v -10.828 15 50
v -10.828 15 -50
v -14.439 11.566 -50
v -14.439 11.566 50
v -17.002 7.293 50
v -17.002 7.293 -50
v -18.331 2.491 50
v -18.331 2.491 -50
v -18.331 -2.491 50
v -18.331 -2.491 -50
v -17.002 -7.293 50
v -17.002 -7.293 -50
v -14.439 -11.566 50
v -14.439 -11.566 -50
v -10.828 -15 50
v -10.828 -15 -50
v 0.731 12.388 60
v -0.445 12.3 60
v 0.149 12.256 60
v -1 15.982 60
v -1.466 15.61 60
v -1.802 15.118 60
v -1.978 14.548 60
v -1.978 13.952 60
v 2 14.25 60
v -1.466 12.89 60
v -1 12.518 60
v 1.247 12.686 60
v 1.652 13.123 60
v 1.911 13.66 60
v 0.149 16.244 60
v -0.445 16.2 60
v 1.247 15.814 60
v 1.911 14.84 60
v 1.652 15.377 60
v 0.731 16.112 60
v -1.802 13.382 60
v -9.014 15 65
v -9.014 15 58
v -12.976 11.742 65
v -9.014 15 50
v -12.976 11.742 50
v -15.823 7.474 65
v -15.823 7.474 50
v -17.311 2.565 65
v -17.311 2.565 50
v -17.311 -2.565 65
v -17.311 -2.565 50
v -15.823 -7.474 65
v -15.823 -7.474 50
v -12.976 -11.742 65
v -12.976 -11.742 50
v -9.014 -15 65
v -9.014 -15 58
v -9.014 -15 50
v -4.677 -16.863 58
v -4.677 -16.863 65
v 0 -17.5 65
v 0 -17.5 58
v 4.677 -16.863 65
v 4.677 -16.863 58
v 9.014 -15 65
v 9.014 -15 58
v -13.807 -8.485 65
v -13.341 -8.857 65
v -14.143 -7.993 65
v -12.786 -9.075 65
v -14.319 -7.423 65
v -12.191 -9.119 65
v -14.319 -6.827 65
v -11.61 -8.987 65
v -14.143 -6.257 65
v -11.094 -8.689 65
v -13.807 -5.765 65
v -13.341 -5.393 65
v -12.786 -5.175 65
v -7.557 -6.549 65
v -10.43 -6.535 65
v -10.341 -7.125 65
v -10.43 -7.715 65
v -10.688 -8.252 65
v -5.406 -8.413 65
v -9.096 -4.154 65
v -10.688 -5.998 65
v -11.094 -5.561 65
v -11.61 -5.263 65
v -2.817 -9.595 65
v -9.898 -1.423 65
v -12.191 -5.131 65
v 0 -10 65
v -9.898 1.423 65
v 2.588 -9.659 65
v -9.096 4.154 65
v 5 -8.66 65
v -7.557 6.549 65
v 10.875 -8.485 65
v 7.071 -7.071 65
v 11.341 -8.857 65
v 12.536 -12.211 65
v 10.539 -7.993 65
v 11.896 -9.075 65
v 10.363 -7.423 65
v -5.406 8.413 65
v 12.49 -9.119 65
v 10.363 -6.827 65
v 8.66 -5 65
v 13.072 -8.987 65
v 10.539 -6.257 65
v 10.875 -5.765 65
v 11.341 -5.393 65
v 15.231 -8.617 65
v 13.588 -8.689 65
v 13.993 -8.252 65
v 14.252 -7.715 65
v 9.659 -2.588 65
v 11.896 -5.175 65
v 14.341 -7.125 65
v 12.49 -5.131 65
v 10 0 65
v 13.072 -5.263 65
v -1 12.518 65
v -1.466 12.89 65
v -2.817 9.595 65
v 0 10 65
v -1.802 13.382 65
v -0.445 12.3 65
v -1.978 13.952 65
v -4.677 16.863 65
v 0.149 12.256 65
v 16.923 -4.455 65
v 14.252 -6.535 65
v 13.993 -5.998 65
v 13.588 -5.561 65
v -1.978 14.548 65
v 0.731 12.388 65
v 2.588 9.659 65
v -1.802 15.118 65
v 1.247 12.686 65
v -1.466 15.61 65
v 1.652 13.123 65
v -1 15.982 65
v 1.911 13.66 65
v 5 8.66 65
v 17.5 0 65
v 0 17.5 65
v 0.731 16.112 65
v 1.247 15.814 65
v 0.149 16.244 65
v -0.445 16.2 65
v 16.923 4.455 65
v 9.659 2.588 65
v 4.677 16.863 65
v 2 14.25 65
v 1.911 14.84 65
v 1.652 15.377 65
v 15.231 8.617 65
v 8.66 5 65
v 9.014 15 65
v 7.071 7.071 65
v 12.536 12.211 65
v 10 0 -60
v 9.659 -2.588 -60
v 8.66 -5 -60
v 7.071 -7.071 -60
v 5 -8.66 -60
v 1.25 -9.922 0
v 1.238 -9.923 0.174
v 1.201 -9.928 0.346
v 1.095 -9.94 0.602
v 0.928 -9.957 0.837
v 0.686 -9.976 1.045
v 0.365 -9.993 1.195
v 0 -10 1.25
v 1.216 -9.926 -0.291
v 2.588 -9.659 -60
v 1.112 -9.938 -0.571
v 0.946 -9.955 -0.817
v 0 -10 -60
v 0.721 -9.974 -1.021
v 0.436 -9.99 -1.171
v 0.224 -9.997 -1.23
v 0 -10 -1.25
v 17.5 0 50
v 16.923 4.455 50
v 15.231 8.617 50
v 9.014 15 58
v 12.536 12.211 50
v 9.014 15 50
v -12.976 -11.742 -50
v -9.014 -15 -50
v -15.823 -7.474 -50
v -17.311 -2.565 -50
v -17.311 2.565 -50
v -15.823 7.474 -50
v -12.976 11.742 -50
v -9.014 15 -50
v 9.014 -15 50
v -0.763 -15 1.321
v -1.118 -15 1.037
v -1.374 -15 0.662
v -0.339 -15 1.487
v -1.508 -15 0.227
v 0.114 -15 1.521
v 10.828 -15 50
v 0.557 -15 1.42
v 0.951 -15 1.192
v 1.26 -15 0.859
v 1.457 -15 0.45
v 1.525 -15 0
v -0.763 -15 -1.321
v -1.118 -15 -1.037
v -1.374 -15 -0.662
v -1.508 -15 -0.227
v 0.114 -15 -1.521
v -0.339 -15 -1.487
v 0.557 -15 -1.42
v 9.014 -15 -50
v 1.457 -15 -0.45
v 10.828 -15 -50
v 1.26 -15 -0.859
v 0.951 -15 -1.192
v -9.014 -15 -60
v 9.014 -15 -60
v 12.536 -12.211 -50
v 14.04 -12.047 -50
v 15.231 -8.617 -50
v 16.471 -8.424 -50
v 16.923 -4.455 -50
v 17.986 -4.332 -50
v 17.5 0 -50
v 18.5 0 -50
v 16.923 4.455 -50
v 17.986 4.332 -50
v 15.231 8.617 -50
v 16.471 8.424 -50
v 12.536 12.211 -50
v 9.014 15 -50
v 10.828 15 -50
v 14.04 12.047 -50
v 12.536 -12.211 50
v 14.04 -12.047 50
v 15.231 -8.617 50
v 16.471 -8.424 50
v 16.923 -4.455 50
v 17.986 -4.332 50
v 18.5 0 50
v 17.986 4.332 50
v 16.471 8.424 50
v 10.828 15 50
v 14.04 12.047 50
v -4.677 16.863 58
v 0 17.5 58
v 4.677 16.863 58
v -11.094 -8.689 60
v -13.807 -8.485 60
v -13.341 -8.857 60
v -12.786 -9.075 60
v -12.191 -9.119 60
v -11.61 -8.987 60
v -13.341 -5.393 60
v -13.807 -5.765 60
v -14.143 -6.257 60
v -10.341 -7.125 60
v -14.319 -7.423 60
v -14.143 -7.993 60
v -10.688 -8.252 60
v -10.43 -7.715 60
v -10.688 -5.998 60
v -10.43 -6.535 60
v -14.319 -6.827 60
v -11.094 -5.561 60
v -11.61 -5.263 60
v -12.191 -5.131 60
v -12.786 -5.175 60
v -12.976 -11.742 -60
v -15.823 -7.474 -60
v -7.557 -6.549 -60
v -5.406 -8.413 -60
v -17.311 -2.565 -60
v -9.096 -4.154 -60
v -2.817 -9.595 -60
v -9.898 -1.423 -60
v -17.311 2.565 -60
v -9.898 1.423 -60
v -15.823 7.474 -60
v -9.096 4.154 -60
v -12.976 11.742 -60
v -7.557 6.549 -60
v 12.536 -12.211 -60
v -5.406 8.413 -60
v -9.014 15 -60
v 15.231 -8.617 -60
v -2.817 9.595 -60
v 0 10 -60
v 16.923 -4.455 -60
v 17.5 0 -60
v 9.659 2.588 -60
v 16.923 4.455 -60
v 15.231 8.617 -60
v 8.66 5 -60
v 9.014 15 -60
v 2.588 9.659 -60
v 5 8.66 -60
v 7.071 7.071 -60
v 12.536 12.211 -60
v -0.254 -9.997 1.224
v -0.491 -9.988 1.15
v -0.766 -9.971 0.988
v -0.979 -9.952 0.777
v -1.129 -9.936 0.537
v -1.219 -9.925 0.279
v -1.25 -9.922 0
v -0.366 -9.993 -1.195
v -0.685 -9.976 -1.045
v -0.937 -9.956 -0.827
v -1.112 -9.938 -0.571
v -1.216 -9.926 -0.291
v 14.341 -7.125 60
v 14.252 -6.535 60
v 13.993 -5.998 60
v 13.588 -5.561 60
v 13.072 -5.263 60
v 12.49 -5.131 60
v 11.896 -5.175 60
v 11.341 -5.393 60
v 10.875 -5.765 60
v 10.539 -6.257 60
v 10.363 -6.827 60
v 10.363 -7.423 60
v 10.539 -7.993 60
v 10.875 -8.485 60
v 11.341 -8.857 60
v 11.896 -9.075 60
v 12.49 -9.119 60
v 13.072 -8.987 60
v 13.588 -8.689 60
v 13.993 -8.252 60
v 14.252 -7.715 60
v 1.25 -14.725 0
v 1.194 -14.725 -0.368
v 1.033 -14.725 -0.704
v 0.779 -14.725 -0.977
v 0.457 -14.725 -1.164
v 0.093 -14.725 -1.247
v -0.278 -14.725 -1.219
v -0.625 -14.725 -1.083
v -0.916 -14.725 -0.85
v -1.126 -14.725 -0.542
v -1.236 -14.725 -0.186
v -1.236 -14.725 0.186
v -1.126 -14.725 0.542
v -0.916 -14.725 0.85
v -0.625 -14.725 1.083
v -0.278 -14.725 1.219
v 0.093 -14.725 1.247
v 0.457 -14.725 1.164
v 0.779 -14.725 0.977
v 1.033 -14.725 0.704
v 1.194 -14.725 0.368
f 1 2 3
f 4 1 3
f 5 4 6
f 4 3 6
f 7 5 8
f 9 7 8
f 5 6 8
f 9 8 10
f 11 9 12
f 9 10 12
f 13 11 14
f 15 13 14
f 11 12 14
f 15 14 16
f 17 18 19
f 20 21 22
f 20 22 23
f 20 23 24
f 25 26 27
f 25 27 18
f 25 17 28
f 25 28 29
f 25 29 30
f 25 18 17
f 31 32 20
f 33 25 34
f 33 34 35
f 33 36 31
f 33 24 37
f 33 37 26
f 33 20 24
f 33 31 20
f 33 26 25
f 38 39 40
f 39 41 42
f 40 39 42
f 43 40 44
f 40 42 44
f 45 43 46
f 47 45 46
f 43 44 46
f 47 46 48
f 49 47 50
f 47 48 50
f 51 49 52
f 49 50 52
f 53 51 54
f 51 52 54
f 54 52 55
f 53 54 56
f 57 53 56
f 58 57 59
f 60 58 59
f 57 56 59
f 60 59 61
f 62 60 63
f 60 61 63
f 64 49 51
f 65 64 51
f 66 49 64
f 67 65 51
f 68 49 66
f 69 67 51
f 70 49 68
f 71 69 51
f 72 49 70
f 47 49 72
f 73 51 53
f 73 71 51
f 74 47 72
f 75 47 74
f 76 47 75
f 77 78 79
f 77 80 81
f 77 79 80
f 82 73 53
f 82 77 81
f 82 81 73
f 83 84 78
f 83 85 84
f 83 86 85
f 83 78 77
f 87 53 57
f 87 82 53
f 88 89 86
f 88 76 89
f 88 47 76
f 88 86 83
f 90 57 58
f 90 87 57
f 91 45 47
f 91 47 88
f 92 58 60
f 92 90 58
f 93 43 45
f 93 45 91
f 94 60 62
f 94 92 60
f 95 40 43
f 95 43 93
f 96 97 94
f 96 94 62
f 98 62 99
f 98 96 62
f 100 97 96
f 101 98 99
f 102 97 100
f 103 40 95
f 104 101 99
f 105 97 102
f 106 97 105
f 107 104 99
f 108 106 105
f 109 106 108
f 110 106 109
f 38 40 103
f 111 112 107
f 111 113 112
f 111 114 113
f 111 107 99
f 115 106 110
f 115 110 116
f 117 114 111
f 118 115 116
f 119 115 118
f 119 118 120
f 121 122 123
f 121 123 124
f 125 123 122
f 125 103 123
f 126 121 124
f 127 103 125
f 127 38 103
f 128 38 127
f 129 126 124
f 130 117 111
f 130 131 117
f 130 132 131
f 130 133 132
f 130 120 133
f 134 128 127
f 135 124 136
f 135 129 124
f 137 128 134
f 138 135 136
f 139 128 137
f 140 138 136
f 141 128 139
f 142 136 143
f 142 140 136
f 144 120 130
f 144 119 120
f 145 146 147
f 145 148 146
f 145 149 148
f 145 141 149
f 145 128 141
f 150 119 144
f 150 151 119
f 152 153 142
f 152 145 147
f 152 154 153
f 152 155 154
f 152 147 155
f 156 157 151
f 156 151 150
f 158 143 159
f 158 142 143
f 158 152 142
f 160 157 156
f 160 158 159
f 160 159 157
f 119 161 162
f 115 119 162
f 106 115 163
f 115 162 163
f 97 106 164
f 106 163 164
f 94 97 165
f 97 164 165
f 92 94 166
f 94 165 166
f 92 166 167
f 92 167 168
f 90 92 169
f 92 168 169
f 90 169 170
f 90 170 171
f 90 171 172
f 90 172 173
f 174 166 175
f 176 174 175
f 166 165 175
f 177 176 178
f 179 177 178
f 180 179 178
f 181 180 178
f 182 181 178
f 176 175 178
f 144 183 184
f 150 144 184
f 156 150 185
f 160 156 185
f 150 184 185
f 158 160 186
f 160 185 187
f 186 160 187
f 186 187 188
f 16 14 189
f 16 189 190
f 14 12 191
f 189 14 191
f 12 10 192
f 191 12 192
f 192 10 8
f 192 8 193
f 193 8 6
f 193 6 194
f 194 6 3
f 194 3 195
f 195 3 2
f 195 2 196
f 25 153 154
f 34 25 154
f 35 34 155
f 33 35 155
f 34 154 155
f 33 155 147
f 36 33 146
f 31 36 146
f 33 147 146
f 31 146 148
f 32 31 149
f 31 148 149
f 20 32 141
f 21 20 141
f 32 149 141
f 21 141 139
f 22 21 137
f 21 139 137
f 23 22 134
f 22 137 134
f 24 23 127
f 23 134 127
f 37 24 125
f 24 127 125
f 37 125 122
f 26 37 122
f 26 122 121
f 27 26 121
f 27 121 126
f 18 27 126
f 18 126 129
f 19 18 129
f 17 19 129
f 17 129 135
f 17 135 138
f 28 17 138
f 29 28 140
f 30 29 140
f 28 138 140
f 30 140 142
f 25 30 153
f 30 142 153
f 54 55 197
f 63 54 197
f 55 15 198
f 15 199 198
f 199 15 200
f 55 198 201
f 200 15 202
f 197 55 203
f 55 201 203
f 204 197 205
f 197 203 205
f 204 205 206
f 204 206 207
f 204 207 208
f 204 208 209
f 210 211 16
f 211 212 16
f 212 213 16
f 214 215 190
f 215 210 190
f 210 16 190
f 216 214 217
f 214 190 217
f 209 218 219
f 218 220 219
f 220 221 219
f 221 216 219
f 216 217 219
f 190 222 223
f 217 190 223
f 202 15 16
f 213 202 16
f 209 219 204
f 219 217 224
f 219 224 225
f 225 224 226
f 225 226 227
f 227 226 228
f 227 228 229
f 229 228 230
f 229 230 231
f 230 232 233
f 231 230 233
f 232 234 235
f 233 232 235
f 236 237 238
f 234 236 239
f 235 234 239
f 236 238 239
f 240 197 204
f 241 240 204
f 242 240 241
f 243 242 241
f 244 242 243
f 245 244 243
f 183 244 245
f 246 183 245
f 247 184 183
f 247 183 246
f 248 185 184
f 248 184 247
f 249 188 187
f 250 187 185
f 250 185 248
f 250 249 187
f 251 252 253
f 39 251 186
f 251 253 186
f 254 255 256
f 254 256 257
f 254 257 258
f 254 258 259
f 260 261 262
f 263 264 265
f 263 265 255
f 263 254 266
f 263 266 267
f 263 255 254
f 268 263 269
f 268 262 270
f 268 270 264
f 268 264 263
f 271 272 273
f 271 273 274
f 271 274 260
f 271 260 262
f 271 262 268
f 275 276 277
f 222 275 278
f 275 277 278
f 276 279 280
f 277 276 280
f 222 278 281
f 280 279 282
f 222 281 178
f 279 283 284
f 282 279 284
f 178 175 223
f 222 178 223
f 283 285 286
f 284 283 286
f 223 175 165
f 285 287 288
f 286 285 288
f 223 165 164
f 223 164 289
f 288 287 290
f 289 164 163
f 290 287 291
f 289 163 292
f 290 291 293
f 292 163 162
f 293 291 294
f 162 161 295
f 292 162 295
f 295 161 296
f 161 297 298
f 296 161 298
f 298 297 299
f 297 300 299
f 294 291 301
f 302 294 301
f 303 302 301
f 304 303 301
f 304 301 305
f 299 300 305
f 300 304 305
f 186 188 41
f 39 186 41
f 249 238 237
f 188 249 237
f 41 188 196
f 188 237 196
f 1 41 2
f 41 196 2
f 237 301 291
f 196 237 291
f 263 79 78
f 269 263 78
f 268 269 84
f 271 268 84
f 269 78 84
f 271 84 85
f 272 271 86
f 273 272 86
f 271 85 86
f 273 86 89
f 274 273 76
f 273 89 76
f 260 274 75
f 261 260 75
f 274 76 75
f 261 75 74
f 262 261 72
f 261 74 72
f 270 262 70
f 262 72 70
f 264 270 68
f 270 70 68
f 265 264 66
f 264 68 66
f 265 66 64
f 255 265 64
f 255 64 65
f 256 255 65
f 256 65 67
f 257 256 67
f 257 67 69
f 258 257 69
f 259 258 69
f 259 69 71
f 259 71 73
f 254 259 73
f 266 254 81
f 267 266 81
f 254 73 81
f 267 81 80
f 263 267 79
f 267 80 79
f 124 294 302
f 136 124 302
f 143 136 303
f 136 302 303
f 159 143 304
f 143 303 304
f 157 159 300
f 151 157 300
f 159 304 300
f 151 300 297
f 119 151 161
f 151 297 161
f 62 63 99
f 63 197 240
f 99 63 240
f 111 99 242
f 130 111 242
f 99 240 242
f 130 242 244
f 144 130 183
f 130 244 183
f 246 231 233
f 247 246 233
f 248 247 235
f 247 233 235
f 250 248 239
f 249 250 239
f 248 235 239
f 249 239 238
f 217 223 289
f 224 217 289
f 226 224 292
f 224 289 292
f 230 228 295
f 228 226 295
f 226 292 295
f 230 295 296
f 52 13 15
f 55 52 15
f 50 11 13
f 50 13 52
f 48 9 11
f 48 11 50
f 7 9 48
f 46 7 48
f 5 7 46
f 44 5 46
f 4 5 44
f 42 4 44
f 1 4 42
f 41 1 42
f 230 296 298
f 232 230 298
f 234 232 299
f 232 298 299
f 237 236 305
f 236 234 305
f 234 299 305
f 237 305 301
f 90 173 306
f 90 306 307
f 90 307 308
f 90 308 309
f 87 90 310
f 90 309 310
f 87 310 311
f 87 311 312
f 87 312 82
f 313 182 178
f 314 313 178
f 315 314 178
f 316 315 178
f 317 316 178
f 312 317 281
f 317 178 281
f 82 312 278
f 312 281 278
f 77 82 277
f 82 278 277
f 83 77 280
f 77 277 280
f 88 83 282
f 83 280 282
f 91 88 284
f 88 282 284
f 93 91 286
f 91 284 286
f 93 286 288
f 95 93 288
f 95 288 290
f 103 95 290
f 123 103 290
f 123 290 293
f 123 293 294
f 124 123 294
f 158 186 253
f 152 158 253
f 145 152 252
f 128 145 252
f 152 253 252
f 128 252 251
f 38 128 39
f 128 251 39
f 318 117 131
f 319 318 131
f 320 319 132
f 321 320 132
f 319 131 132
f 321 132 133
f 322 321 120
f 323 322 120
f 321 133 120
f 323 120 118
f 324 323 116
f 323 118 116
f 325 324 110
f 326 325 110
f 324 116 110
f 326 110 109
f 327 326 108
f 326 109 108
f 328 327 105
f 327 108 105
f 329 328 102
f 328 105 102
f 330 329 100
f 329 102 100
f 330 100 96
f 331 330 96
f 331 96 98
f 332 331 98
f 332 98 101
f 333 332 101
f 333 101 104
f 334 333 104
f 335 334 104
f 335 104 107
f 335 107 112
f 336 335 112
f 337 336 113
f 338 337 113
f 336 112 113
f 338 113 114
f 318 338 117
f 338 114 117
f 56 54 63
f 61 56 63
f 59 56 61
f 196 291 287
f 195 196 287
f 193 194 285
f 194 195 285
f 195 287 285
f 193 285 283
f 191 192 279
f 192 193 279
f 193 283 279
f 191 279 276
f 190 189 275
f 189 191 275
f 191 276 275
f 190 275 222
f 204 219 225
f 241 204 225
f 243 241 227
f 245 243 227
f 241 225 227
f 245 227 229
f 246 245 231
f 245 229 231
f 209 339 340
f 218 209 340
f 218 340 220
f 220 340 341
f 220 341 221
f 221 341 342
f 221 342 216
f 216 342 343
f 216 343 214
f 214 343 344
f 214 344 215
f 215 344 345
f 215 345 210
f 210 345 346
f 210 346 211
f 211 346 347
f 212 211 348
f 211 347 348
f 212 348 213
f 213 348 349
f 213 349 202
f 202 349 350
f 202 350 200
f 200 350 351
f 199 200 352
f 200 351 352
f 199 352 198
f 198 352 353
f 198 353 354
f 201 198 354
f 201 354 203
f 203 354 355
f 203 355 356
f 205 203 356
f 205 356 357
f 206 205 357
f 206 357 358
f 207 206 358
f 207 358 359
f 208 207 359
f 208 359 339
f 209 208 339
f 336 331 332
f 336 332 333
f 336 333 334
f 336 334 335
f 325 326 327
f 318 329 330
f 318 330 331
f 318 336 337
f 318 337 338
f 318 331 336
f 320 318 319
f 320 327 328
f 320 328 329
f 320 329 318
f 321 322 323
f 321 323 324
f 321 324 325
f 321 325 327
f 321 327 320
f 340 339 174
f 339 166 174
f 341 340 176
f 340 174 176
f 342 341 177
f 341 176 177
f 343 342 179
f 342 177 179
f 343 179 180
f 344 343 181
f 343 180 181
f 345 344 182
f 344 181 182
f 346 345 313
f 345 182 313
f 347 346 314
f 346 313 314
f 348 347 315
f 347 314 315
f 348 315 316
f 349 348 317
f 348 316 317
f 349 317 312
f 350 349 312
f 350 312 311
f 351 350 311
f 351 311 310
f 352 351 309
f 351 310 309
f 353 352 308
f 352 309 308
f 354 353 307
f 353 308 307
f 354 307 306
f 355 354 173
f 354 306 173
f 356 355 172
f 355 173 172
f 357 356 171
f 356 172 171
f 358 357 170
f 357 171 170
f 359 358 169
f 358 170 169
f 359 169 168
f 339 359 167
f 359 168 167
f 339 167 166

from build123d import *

# Parameters (mm, degrees)
BOSS_EXTRUDE1_DEPTH         = 65
BOSS_EXTRUDE1_DEPTH_BACK    = 60
SKETCH1_R                   = 10
BOSS_EXTRUDE2_DEPTH         = 50
BOSS_EXTRUDE2_DEPTH_BACK    = 50
BOSS_EXTRUDE3_START         = -7
SKETCH5_R                   = 17.5
SKETCH5_R_2                 = 10
BOSS_EXTRUDE3_DEPTH         = 7
SKETCH6_R                   = 2
CUT_EXTRUDE1_DEPTH          = 5
M3_TAPPED_HOLE1_D           = 2.5
M3_TAPPED_HOLE1_DEPTH       = 7.5
M3_TAPPED_HOLE1_CSINK_D     = 3.05
M3_TAPPED_HOLE1_CSINK_ANGLE = 90
M3_TAPPED_HOLE1_TIP         = 0.751075774


with BuildPart() as part:
    # Sketch1 → Boss-Extrude1 (new, two sides: drawn at the far end of the back side and taken through both)
    with BuildSketch(Plane.XY.offset(-BOSS_EXTRUDE1_DEPTH_BACK)):
        with BuildLine():
            Line((9.013878189, 15), (-9.013878189, 15))
            ThreePointArc((-9.013878189, 15), (-17.5, 0), (-9.013878189, -15))
            Line((-9.013878189, -15), (9.013878189, -15))
            ThreePointArc((9.013878189, -15), (17.5, 0), (9.013878189, 15))
        make_face()
        Circle(SKETCH1_R, mode=Mode.SUBTRACT)
    extrude(amount=BOSS_EXTRUDE1_DEPTH + BOSS_EXTRUDE1_DEPTH_BACK)

    # Sketch1<23> → Boss-Extrude2 (add, two sides: drawn at the far end of the back side and taken through both)
    with BuildSketch(Plane.XY.offset(-BOSS_EXTRUDE2_DEPTH_BACK)):
        with BuildLine():
            Line((-9.013878189, 15), (-10.828203914, 15))
            ThreePointArc((-10.828203914, 15), (-18.5, 0), (-10.828203914, -15))
            Line((-10.828203914, -15), (-9.013878189, -15))
            ThreePointArc((-9.013878189, -15), (-17.5, 0), (-9.013878189, 15))
        make_face()
        with BuildLine():
            ThreePointArc((10.828203914, -15), (18.5, 0), (10.828203914, 15))
            Line((10.828203914, 15), (9.013878189, 15))
            ThreePointArc((9.013878189, 15), (17.5, 0), (9.013878189, -15))
            Line((9.013878189, -15), (10.828203914, -15))
        make_face()
    extrude(amount=BOSS_EXTRUDE2_DEPTH + BOSS_EXTRUDE2_DEPTH_BACK)

    # Sketch5 → Boss-Extrude3 (add)
    with BuildSketch(Plane.XY.offset(65).offset(BOSS_EXTRUDE3_START)):
        Circle(SKETCH5_R)
        Circle(SKETCH5_R_2, mode=Mode.SUBTRACT)
    extrude(amount=BOSS_EXTRUDE3_DEPTH)

    # Sketch6 → Cut-Extrude1 (cut)
    with BuildSketch(Plane.XY.offset(65)):
        with Locations((0, 14.25)):
            Circle(SKETCH6_R)
        with Locations((12.340862004, -7.125)):
            Circle(SKETCH6_R)
        with Locations((-12.340862004, -7.125)):
            Circle(SKETCH6_R)
    extrude(amount=-CUT_EXTRUDE1_DEPTH, mode=Mode.SUBTRACT)

    # M3 Tapped Hole1
    with Locations(Plane(origin=(0, -15, 0), x_dir=(-1, 0, 0), z_dir=(0, -1, 0))):
        with Locations((0, 0)):
            CounterSinkHole(M3_TAPPED_HOLE1_D / 2, M3_TAPPED_HOLE1_CSINK_D / 2, depth=M3_TAPPED_HOLE1_DEPTH, counter_sink_angle=M3_TAPPED_HOLE1_CSINK_ANGLE)
            with Locations((0, 0, -(M3_TAPPED_HOLE1_DEPTH + M3_TAPPED_HOLE1_TIP / 2))):  # 118° drill point
                Cone(0, M3_TAPPED_HOLE1_D / 2, M3_TAPPED_HOLE1_TIP, mode=Mode.SUBTRACT)


solid = part.part
